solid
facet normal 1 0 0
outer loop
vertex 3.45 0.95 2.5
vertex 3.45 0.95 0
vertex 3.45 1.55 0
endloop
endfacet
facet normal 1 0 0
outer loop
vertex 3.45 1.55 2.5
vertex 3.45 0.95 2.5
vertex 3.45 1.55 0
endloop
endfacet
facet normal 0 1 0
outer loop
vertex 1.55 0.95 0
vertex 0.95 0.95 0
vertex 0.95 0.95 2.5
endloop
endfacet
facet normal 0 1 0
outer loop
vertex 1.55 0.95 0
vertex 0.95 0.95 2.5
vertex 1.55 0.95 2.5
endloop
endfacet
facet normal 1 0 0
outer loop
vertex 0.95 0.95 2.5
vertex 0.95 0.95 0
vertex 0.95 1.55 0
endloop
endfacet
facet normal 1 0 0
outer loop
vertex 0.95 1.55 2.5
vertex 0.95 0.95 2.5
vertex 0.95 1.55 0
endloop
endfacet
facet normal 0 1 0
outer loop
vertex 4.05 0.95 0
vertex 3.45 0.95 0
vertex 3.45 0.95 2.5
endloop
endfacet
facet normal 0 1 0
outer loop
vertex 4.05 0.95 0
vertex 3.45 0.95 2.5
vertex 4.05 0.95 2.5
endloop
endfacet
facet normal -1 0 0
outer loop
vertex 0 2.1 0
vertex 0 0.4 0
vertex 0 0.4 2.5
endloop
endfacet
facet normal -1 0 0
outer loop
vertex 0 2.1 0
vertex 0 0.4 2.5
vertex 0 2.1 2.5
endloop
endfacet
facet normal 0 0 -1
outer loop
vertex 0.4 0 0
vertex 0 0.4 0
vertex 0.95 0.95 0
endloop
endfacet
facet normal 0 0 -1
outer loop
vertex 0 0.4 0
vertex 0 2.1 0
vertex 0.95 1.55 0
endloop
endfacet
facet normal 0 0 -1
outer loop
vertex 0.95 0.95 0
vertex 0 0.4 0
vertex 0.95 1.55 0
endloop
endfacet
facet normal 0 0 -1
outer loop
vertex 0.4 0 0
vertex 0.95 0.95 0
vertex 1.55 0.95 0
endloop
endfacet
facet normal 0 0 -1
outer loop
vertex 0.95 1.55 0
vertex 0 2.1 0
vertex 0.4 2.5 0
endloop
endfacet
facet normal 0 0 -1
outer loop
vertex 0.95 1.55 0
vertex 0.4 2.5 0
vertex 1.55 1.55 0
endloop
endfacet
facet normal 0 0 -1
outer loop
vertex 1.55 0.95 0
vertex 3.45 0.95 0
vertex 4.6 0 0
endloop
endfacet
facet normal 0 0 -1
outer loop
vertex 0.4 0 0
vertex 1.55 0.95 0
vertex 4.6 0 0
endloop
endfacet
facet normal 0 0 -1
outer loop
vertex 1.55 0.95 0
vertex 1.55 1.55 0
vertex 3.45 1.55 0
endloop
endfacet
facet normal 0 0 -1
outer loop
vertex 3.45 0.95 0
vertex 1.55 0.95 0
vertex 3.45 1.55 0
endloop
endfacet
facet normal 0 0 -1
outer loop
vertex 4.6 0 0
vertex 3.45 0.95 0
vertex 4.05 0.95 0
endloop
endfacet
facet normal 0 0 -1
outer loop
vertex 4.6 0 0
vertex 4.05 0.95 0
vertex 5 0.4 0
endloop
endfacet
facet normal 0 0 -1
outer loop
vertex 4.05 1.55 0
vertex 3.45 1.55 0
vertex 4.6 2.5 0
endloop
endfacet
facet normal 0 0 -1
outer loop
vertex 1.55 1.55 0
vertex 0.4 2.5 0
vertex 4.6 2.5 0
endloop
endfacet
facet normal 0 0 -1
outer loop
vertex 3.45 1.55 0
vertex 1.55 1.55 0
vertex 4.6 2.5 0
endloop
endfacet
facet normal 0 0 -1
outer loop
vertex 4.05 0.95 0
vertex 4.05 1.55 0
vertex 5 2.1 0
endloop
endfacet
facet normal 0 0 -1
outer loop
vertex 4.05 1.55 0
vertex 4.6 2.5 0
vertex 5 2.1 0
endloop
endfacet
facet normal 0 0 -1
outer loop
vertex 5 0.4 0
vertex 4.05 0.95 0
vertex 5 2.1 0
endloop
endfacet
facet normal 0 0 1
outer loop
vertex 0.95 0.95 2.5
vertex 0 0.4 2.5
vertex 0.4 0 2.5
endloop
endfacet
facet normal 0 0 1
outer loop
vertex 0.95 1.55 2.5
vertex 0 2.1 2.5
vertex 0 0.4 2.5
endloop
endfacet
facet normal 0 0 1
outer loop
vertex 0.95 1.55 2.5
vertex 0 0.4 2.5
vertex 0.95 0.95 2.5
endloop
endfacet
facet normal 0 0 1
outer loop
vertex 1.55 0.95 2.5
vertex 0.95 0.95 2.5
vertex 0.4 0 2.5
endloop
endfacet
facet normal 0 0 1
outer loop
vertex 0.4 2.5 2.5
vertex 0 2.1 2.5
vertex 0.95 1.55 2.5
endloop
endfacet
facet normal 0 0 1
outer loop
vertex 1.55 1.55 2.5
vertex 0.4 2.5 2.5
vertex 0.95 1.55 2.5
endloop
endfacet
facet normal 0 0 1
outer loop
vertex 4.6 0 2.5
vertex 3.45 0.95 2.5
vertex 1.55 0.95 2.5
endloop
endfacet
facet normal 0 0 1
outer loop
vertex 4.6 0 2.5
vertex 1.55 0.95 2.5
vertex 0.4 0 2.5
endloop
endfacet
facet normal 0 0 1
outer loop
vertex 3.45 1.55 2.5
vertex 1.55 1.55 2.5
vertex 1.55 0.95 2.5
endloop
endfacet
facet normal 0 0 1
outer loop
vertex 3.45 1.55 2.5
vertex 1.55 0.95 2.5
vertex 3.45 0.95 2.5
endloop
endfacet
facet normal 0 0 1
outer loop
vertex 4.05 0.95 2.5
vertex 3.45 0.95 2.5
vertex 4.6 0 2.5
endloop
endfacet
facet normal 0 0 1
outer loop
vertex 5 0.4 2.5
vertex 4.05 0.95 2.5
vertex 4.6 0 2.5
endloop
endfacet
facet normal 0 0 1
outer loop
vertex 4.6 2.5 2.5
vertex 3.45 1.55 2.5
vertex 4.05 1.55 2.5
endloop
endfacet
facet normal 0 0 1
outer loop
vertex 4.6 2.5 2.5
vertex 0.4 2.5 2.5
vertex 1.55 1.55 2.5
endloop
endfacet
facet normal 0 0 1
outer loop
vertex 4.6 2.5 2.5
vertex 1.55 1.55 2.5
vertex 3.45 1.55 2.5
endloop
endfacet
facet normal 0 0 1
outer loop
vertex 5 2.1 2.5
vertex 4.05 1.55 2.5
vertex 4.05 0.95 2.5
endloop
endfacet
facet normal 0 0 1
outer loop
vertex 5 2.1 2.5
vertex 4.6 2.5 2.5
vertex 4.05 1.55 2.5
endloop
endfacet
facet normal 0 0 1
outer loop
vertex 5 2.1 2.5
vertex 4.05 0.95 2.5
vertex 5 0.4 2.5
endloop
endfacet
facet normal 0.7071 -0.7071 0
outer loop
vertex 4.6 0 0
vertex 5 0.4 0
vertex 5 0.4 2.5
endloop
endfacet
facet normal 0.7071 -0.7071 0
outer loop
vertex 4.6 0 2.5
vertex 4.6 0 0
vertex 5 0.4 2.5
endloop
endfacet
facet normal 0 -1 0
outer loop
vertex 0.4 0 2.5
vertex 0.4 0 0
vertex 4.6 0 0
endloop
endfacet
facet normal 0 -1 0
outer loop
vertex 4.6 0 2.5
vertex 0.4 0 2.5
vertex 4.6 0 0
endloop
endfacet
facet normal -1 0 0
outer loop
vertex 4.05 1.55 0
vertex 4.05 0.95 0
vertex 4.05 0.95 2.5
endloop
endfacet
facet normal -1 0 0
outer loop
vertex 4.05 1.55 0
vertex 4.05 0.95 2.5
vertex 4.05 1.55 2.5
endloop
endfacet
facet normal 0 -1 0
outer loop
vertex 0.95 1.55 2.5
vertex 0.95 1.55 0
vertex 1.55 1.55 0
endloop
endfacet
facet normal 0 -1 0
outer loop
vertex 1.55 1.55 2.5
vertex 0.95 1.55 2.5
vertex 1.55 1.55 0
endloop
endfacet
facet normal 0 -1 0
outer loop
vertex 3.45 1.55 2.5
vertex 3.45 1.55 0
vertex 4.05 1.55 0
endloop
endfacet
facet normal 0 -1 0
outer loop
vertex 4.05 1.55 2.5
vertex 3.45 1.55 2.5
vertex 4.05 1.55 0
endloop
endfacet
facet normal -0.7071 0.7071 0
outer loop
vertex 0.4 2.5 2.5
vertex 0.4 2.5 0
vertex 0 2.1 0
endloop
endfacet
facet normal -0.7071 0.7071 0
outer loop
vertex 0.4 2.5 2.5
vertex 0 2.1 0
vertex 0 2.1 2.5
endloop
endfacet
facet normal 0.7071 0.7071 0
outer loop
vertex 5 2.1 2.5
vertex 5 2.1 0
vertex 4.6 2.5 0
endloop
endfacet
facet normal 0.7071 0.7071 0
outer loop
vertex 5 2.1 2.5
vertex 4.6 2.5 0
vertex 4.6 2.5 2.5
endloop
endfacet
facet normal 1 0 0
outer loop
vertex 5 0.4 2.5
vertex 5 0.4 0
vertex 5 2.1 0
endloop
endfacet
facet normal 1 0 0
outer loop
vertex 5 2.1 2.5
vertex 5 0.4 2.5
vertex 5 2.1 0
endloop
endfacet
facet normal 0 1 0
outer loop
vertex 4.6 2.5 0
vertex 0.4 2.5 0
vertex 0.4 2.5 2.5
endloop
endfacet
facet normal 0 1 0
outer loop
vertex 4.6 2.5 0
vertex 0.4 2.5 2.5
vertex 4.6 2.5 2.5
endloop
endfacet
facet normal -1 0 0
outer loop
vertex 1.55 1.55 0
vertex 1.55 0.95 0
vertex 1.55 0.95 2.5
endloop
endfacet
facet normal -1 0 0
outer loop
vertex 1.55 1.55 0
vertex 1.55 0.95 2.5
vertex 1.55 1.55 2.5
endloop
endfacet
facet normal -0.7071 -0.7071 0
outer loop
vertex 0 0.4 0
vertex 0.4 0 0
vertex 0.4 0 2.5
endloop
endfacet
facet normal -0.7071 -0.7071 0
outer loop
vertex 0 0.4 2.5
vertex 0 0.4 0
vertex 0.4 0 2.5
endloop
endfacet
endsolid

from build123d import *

# Parameters (mm, degrees)
F0_W     = 5
F0_H     = 2.5
F0_W_2   = 0.6
F0_H_2   = 0.6
F1_DEPTH = 2.5
F2_SIZE  = 0.4


with BuildPart() as f1:
    # F0 (on Top) → F1 (new body)
    with BuildSketch(Plane.XY):
        with Locations((2.5, 1.25)):
            Rectangle(F0_W, F0_H)
        with Locations((1.25, 1.25)):
            Rectangle(F0_W_2, F0_H_2, mode=Mode.SUBTRACT)
        with Locations((3.75, 1.25)):
            Rectangle(F0_W_2, F0_H_2, mode=Mode.SUBTRACT)
    extrude(amount=F1_DEPTH)

    # F2
    f2_edges = [f1.edges().sort_by_distance(p)[0] for p in [
        (0, 2.5, 1.25),
        (0, 0, 1.25),
        (5, 0, 1.25),
        (5, 2.5, 1.25),
    ]]
    chamfer(f2_edges, length=F2_SIZE)


solid = f1.part
